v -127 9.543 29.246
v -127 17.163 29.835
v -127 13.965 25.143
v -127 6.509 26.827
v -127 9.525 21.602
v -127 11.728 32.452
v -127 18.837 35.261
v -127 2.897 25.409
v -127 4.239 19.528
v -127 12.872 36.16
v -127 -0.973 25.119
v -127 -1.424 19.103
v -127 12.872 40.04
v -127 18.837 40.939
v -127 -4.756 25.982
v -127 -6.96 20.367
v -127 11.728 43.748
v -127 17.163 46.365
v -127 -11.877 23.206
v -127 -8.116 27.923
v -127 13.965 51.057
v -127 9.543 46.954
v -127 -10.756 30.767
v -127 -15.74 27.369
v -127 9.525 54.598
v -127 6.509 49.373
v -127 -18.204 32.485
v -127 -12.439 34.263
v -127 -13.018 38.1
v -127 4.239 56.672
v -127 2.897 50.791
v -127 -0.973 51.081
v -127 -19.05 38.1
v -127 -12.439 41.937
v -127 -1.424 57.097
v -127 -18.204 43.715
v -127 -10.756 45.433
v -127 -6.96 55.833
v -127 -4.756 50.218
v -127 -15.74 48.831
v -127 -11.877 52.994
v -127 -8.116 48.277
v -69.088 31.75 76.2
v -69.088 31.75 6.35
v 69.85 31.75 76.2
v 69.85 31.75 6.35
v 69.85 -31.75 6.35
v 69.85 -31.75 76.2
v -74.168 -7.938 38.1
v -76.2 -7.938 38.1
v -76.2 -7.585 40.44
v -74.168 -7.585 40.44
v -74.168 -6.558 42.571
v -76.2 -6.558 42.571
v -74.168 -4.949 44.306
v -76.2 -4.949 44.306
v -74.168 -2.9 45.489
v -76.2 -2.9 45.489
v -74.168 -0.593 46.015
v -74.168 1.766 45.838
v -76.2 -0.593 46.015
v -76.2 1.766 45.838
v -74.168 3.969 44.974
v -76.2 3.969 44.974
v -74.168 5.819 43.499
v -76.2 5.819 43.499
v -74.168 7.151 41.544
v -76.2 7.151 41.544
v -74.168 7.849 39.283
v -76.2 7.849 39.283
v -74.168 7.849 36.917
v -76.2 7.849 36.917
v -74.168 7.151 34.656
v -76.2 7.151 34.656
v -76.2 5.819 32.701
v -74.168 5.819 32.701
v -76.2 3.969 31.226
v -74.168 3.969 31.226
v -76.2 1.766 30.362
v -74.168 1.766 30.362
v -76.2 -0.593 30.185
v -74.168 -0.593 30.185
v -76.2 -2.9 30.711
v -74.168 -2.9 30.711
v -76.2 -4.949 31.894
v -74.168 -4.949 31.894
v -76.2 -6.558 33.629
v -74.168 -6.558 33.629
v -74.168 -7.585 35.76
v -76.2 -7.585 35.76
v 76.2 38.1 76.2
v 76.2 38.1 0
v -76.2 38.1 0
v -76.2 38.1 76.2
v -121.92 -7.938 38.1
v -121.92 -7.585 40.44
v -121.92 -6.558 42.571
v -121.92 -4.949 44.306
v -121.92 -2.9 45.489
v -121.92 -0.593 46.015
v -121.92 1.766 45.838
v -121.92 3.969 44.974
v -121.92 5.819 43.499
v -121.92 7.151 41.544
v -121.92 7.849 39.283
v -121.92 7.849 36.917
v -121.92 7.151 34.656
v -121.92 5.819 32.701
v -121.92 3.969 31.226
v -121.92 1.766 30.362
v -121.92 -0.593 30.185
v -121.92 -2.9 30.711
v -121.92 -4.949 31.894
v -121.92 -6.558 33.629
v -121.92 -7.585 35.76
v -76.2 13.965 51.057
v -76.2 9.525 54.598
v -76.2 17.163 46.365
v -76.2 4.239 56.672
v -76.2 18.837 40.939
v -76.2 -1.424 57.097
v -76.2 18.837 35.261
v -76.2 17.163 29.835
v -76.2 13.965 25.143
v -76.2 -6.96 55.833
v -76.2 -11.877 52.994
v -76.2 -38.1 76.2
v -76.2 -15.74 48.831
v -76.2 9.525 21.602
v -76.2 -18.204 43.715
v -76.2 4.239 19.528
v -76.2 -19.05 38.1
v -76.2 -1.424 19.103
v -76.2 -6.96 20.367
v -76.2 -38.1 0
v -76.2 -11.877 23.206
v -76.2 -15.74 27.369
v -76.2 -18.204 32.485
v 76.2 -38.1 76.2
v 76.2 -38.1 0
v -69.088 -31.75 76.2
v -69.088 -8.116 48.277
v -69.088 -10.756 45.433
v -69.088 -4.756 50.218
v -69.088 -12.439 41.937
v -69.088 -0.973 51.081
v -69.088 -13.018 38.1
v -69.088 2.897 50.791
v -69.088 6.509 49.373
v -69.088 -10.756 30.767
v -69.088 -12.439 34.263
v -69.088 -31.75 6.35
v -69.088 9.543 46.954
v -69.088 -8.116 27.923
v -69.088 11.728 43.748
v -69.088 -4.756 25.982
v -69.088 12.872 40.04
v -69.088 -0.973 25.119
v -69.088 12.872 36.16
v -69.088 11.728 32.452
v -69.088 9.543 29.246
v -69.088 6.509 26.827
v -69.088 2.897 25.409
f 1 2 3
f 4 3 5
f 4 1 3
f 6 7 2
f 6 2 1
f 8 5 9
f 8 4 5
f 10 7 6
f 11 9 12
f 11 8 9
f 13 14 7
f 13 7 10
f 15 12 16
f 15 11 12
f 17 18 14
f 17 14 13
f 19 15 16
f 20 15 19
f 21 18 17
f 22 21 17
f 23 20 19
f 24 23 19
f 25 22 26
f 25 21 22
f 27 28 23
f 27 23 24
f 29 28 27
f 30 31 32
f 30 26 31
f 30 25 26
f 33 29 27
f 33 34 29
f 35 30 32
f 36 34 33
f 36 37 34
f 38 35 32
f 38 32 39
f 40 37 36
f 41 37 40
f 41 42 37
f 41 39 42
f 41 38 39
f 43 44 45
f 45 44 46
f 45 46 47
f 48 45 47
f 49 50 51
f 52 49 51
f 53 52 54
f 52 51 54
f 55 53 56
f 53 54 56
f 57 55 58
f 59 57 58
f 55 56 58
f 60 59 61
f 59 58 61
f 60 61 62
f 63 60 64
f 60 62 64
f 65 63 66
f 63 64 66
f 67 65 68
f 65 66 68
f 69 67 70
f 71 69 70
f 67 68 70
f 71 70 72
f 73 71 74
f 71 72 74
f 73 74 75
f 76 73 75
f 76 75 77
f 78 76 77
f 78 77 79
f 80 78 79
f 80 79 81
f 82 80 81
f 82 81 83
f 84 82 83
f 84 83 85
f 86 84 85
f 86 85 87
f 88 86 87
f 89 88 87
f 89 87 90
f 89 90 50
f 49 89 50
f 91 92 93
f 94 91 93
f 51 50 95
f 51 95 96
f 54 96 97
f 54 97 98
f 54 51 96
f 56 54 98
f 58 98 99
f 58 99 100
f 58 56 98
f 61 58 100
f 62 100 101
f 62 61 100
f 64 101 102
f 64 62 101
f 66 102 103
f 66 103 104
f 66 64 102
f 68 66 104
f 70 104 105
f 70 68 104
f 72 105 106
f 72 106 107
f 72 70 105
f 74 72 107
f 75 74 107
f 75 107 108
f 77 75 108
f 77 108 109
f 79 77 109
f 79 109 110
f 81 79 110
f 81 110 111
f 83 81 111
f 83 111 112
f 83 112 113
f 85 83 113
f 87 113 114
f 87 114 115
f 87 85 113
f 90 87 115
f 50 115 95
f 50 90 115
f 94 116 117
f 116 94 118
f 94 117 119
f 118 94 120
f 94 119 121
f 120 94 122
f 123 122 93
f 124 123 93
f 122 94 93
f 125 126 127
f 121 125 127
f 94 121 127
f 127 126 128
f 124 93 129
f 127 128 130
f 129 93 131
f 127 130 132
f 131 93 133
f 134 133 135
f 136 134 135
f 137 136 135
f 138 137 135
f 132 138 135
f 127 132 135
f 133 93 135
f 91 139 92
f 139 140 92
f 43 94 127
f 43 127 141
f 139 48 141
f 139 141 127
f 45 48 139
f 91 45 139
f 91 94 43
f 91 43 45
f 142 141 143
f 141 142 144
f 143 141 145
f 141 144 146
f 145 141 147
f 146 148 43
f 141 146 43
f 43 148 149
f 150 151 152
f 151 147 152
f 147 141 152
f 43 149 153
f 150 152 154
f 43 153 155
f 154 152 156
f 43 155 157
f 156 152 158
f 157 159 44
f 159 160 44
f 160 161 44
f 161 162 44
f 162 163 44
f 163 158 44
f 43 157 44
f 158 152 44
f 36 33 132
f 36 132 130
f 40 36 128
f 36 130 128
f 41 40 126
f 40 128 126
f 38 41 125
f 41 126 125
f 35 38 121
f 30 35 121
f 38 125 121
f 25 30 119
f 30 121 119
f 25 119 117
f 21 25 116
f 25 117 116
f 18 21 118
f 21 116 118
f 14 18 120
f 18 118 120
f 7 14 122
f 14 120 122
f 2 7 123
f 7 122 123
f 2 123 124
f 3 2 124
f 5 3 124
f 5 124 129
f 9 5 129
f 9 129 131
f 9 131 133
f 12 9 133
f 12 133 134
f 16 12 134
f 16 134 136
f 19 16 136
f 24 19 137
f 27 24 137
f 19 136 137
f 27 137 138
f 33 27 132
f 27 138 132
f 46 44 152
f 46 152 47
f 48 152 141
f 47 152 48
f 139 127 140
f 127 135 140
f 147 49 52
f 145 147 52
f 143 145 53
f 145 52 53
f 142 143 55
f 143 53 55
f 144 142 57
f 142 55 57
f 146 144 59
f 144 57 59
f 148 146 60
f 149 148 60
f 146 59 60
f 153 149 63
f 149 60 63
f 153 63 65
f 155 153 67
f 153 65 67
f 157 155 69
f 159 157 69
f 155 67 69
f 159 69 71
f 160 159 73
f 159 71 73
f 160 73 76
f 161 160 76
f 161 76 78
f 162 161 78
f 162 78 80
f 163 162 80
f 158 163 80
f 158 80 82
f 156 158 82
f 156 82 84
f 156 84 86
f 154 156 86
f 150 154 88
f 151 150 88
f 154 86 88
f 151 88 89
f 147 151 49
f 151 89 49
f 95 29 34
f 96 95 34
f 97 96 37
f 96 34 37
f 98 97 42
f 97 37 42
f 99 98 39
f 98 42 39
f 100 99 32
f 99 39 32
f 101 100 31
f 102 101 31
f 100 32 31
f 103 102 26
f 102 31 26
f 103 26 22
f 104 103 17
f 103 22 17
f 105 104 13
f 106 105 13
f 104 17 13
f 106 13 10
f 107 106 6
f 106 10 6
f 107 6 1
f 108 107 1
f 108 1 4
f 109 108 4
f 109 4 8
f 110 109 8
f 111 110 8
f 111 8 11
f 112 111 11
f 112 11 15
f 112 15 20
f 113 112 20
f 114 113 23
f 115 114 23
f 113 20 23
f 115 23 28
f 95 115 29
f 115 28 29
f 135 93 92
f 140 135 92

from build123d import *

# Parameters (mm, degrees)
F0_W     = 152.4
F0_H     = 76.2
F1_DEPTH = 6.35
F2_W     = 138.938
F2_H     = 6.35
F3_DEPTH = 69.85
F4_R     = 19.05
F4_R_2   = 7.9375
F5_DEPTH = 50.8
F6_R     = 7.9375
F7_DEPTH = 7.62
F8_SIZE  = 5.08
F9_SIZE  = 5.08


with BuildPart() as f1:
    # F0 (on Top) → F1 (new body)
    with BuildSketch(Plane.XY):
        Rectangle(F0_W, F0_H)
    extrude(amount=F1_DEPTH)

    # F2 (on face) → F3 (join)
    with BuildSketch(Plane.XY.offset(6.35)):
        Polygon((-69.088, 38.1), (-76.2, 38.1), (-76.2, -38.1), (-69.088, -38.1), (-69.088, -31.75), (-69.088, 31.75), align=None)
        Polygon((76.2, 38.1), (-69.088, 38.1), (-69.088, 31.75), (69.85, 31.75), (76.2, 31.75), align=None)
        with Locations((0.381, -34.925)):
            Rectangle(F2_W, F2_H)
        Polygon((76.2, 31.75), (69.85, 31.75), (69.85, -31.75), (69.85, -38.1), (76.2, -38.1), align=None)
    extrude(amount=F3_DEPTH)

    # F4 (on face) → F5 (join)
    with BuildSketch(Plane(origin=(-76.2, 0, 0), x_dir=(0, -1, 0), z_dir=(-1, 0, 0))):
        with Locations((0, 38.1)):
            Circle(F4_R)
        with Locations((0, 38.1)):
            Circle(F4_R_2, mode=Mode.SUBTRACT)
    extrude(amount=F5_DEPTH)

    # F6 (on face) → F7 (cut)
    with BuildSketch(Plane(origin=(-76.2, 0, 0), x_dir=(0, -1, 0), z_dir=(-1, 0, 0))):
        with Locations((0, 38.1)):
            Circle(F6_R)
    extrude(amount=-F7_DEPTH, mode=Mode.SUBTRACT)

    # F8
    f8_edges = [f1.edges().sort_by_distance(p)[0] for p in [
        (-69.088, 7.9375, 38.1),
    ]]
    chamfer(f8_edges, length=F8_SIZE)

    # F9
    f9_edges = [f1.edges().sort_by_distance(p)[0] for p in [
        (-127, 7.9375, 38.1),
    ]]
    chamfer(f9_edges, length=F9_SIZE)


solid = f1.part
